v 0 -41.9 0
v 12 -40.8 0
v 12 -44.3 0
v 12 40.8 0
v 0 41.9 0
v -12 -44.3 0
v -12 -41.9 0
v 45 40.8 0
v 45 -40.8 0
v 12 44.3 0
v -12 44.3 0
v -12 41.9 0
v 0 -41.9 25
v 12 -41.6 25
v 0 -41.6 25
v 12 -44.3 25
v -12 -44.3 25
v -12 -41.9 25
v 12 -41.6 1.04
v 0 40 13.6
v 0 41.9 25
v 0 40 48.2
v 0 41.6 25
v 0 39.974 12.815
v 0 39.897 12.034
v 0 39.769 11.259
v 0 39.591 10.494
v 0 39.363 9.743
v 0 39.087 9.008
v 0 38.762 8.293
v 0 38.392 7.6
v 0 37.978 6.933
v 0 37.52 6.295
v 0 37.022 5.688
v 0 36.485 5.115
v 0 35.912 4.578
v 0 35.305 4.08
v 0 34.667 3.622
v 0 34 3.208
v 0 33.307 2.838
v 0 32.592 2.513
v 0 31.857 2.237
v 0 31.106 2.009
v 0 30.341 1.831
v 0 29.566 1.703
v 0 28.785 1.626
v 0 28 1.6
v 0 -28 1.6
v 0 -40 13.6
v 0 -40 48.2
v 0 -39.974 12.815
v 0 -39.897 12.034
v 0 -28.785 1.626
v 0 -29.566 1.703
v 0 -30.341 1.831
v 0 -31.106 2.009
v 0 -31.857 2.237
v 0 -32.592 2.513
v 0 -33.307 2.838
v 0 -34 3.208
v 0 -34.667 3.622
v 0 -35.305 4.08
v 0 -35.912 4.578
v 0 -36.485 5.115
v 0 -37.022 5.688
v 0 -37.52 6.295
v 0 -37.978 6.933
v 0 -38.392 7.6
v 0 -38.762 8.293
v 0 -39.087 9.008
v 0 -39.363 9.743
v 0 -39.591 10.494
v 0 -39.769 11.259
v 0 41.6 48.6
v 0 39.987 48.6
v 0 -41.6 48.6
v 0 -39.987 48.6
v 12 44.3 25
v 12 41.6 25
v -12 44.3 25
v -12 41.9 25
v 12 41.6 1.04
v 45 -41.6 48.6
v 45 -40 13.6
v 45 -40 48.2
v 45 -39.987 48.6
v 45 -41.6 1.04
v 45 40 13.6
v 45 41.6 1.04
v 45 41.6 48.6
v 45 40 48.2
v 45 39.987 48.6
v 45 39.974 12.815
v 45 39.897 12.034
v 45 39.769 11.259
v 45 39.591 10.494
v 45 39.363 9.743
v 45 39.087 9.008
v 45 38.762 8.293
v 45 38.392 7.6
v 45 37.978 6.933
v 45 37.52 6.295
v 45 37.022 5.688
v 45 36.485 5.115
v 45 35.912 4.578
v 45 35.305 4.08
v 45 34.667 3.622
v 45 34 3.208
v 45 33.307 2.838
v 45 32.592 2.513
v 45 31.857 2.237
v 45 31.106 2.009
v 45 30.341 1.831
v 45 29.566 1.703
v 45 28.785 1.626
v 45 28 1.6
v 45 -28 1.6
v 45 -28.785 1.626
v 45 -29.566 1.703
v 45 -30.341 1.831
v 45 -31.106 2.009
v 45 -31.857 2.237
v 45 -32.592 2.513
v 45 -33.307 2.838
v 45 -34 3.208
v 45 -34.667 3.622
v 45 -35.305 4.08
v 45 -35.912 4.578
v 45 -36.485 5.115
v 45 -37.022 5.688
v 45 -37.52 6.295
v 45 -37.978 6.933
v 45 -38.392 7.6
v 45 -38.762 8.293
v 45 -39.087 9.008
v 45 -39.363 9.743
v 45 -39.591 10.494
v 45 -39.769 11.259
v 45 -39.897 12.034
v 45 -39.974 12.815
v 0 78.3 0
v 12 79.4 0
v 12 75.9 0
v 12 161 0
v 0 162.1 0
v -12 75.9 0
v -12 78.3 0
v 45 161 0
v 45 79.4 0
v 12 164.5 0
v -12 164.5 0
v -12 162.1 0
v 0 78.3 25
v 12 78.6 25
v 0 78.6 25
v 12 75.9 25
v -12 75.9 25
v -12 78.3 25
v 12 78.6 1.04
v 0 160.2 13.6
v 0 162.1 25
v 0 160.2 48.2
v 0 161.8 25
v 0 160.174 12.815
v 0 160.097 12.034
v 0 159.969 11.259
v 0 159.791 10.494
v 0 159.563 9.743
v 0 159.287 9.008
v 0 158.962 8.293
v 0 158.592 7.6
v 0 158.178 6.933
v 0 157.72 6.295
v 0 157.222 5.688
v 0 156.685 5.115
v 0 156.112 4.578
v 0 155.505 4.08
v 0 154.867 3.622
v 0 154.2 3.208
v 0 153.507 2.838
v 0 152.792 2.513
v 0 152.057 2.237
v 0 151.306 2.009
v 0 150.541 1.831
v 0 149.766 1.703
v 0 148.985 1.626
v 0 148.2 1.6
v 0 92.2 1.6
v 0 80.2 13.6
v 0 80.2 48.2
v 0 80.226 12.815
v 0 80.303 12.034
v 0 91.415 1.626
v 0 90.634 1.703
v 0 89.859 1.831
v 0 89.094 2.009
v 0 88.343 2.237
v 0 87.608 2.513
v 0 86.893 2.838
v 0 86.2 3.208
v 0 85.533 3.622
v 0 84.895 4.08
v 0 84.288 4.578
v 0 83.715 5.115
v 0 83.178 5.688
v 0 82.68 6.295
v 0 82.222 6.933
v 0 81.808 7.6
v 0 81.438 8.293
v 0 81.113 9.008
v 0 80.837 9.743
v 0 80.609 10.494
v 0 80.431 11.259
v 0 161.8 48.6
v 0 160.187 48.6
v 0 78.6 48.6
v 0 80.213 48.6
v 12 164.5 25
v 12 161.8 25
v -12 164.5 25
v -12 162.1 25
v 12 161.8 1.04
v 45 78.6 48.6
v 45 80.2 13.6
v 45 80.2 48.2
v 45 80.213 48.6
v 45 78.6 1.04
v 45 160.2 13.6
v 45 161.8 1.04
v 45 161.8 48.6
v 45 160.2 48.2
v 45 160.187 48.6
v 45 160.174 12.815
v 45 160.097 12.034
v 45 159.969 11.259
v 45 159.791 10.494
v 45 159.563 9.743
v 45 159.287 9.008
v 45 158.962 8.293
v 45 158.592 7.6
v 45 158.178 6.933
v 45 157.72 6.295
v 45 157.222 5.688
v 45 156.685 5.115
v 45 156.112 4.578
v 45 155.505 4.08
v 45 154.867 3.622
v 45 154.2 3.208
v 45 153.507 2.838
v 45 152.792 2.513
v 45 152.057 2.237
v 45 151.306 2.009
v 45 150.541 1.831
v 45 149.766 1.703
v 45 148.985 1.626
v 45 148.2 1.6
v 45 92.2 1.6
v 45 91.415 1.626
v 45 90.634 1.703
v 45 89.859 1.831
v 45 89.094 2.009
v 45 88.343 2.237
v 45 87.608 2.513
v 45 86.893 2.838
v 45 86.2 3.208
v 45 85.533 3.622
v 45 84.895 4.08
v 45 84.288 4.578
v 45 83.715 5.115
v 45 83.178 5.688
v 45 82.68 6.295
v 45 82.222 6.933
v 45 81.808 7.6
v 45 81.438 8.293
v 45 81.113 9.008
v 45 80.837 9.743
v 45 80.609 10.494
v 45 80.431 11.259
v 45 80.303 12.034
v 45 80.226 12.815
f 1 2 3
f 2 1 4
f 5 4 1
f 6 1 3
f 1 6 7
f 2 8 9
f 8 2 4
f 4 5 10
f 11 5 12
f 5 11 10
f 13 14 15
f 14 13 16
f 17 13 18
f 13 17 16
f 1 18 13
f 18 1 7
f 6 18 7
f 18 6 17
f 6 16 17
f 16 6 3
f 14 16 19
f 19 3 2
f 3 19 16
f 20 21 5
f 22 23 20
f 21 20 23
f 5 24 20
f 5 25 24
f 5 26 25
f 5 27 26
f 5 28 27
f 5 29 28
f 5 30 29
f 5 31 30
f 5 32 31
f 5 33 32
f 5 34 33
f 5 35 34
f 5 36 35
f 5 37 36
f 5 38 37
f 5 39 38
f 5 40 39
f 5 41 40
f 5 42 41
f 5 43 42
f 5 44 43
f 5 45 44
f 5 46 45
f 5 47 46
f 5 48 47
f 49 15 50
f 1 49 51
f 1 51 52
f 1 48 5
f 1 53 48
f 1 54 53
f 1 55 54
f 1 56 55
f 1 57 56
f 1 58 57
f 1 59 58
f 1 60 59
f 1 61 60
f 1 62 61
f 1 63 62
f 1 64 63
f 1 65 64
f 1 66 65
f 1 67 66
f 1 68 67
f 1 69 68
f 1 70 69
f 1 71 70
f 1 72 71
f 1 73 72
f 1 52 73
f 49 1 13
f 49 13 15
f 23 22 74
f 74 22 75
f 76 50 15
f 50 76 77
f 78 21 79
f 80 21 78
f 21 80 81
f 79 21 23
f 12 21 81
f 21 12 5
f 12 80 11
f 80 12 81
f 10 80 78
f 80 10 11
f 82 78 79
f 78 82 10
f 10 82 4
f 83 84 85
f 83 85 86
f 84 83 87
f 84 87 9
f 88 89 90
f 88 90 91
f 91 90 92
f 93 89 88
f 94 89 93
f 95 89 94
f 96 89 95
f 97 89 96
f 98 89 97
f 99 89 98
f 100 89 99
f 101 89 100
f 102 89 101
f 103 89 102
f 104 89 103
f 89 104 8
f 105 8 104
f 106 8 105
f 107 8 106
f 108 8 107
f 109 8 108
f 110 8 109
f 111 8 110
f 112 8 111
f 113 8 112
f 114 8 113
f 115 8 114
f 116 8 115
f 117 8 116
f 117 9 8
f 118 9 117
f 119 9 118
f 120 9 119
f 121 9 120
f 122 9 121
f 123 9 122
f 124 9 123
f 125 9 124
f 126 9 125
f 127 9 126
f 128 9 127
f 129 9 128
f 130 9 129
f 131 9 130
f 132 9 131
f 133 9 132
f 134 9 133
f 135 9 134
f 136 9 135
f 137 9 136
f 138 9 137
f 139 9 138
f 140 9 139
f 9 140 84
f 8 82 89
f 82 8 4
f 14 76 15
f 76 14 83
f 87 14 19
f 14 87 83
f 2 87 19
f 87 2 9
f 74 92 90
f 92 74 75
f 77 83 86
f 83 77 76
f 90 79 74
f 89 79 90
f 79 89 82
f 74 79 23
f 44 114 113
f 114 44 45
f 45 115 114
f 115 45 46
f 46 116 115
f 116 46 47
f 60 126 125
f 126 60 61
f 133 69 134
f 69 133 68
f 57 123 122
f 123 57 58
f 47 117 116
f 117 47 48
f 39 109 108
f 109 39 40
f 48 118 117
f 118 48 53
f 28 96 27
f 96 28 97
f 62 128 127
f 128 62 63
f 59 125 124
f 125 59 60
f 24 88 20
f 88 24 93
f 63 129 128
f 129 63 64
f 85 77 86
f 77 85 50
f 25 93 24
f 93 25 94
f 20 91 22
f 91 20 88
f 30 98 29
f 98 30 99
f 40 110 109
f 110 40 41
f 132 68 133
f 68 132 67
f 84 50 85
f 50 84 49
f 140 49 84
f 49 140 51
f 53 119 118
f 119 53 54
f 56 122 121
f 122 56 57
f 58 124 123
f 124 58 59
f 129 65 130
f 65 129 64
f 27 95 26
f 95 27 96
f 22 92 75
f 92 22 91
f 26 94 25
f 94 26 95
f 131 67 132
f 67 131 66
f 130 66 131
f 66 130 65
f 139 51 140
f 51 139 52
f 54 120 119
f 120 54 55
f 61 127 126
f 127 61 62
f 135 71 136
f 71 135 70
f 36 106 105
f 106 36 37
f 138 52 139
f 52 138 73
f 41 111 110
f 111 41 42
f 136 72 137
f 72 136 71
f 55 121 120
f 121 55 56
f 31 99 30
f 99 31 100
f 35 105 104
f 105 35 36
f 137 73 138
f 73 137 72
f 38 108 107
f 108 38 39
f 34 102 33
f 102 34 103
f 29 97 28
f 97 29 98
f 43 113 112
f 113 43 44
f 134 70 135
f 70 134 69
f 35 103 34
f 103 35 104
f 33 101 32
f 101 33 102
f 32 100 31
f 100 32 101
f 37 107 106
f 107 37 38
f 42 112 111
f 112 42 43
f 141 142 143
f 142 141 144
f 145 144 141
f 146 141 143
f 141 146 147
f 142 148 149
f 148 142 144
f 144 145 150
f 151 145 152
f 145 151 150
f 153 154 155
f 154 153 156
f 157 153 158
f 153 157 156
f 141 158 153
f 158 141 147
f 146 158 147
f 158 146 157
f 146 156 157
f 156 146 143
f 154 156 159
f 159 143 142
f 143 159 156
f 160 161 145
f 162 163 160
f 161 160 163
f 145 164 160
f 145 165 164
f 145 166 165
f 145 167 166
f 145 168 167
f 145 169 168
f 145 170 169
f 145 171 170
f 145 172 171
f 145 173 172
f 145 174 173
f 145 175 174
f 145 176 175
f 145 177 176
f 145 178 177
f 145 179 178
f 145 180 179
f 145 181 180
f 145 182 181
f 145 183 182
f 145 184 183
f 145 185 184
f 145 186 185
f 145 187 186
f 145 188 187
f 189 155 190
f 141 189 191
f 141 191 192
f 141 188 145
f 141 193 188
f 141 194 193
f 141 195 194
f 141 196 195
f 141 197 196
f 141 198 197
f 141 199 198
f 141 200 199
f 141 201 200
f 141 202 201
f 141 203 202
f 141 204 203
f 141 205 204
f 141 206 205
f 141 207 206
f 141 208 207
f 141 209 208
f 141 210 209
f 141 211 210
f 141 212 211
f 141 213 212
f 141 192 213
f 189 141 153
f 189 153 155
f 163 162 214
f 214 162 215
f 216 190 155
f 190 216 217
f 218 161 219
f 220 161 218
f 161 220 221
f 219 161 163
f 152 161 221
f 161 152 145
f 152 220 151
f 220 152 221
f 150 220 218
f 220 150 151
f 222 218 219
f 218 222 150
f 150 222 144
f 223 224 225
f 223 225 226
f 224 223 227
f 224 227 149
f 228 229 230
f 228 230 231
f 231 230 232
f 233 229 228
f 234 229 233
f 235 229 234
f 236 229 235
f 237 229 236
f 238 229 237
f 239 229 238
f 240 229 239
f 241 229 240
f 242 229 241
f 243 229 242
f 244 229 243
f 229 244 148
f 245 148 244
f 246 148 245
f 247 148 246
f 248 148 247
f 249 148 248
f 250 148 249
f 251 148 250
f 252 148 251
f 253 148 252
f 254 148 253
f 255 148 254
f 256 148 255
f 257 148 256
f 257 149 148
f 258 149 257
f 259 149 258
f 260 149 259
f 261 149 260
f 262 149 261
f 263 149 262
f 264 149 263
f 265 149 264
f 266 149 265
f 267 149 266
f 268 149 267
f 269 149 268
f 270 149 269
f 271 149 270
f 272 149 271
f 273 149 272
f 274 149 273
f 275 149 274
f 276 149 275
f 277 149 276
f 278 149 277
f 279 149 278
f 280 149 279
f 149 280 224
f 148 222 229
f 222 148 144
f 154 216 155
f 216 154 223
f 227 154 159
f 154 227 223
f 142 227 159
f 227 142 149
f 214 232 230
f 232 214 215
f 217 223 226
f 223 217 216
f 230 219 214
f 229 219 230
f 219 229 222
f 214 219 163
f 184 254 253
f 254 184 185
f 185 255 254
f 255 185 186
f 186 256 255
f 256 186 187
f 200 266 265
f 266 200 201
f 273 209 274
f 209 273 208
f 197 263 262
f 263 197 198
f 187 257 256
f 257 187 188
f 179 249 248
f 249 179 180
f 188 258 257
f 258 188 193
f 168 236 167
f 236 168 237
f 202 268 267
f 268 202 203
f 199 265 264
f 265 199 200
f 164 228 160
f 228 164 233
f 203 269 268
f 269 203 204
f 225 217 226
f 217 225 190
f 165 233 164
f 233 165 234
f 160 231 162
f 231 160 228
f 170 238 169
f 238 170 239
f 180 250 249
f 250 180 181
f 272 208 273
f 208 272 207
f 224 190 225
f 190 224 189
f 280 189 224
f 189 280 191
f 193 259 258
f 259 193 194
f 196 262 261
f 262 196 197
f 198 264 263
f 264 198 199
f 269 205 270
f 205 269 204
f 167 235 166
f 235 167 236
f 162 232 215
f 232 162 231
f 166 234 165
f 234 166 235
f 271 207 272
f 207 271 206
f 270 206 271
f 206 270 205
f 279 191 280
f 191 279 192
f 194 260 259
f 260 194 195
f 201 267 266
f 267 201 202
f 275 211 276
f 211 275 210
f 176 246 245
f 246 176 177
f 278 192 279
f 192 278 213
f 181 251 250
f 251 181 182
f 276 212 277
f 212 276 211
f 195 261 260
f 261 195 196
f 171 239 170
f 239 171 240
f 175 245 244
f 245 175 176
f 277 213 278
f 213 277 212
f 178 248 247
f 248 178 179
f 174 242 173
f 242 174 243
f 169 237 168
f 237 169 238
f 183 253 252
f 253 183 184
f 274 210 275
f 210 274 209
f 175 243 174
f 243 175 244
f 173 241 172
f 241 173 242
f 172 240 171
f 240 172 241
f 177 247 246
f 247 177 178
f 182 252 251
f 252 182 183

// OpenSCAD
// Print this first. Two joint stubs: slide the skirted end of one onto the
// bare end of the other and tune joint_tol in +/-0.05 steps until it holds
// alignment without forcing. Overrides must stay above any geometry.
include <nuggs-yard.scad>
part = "coupon";
